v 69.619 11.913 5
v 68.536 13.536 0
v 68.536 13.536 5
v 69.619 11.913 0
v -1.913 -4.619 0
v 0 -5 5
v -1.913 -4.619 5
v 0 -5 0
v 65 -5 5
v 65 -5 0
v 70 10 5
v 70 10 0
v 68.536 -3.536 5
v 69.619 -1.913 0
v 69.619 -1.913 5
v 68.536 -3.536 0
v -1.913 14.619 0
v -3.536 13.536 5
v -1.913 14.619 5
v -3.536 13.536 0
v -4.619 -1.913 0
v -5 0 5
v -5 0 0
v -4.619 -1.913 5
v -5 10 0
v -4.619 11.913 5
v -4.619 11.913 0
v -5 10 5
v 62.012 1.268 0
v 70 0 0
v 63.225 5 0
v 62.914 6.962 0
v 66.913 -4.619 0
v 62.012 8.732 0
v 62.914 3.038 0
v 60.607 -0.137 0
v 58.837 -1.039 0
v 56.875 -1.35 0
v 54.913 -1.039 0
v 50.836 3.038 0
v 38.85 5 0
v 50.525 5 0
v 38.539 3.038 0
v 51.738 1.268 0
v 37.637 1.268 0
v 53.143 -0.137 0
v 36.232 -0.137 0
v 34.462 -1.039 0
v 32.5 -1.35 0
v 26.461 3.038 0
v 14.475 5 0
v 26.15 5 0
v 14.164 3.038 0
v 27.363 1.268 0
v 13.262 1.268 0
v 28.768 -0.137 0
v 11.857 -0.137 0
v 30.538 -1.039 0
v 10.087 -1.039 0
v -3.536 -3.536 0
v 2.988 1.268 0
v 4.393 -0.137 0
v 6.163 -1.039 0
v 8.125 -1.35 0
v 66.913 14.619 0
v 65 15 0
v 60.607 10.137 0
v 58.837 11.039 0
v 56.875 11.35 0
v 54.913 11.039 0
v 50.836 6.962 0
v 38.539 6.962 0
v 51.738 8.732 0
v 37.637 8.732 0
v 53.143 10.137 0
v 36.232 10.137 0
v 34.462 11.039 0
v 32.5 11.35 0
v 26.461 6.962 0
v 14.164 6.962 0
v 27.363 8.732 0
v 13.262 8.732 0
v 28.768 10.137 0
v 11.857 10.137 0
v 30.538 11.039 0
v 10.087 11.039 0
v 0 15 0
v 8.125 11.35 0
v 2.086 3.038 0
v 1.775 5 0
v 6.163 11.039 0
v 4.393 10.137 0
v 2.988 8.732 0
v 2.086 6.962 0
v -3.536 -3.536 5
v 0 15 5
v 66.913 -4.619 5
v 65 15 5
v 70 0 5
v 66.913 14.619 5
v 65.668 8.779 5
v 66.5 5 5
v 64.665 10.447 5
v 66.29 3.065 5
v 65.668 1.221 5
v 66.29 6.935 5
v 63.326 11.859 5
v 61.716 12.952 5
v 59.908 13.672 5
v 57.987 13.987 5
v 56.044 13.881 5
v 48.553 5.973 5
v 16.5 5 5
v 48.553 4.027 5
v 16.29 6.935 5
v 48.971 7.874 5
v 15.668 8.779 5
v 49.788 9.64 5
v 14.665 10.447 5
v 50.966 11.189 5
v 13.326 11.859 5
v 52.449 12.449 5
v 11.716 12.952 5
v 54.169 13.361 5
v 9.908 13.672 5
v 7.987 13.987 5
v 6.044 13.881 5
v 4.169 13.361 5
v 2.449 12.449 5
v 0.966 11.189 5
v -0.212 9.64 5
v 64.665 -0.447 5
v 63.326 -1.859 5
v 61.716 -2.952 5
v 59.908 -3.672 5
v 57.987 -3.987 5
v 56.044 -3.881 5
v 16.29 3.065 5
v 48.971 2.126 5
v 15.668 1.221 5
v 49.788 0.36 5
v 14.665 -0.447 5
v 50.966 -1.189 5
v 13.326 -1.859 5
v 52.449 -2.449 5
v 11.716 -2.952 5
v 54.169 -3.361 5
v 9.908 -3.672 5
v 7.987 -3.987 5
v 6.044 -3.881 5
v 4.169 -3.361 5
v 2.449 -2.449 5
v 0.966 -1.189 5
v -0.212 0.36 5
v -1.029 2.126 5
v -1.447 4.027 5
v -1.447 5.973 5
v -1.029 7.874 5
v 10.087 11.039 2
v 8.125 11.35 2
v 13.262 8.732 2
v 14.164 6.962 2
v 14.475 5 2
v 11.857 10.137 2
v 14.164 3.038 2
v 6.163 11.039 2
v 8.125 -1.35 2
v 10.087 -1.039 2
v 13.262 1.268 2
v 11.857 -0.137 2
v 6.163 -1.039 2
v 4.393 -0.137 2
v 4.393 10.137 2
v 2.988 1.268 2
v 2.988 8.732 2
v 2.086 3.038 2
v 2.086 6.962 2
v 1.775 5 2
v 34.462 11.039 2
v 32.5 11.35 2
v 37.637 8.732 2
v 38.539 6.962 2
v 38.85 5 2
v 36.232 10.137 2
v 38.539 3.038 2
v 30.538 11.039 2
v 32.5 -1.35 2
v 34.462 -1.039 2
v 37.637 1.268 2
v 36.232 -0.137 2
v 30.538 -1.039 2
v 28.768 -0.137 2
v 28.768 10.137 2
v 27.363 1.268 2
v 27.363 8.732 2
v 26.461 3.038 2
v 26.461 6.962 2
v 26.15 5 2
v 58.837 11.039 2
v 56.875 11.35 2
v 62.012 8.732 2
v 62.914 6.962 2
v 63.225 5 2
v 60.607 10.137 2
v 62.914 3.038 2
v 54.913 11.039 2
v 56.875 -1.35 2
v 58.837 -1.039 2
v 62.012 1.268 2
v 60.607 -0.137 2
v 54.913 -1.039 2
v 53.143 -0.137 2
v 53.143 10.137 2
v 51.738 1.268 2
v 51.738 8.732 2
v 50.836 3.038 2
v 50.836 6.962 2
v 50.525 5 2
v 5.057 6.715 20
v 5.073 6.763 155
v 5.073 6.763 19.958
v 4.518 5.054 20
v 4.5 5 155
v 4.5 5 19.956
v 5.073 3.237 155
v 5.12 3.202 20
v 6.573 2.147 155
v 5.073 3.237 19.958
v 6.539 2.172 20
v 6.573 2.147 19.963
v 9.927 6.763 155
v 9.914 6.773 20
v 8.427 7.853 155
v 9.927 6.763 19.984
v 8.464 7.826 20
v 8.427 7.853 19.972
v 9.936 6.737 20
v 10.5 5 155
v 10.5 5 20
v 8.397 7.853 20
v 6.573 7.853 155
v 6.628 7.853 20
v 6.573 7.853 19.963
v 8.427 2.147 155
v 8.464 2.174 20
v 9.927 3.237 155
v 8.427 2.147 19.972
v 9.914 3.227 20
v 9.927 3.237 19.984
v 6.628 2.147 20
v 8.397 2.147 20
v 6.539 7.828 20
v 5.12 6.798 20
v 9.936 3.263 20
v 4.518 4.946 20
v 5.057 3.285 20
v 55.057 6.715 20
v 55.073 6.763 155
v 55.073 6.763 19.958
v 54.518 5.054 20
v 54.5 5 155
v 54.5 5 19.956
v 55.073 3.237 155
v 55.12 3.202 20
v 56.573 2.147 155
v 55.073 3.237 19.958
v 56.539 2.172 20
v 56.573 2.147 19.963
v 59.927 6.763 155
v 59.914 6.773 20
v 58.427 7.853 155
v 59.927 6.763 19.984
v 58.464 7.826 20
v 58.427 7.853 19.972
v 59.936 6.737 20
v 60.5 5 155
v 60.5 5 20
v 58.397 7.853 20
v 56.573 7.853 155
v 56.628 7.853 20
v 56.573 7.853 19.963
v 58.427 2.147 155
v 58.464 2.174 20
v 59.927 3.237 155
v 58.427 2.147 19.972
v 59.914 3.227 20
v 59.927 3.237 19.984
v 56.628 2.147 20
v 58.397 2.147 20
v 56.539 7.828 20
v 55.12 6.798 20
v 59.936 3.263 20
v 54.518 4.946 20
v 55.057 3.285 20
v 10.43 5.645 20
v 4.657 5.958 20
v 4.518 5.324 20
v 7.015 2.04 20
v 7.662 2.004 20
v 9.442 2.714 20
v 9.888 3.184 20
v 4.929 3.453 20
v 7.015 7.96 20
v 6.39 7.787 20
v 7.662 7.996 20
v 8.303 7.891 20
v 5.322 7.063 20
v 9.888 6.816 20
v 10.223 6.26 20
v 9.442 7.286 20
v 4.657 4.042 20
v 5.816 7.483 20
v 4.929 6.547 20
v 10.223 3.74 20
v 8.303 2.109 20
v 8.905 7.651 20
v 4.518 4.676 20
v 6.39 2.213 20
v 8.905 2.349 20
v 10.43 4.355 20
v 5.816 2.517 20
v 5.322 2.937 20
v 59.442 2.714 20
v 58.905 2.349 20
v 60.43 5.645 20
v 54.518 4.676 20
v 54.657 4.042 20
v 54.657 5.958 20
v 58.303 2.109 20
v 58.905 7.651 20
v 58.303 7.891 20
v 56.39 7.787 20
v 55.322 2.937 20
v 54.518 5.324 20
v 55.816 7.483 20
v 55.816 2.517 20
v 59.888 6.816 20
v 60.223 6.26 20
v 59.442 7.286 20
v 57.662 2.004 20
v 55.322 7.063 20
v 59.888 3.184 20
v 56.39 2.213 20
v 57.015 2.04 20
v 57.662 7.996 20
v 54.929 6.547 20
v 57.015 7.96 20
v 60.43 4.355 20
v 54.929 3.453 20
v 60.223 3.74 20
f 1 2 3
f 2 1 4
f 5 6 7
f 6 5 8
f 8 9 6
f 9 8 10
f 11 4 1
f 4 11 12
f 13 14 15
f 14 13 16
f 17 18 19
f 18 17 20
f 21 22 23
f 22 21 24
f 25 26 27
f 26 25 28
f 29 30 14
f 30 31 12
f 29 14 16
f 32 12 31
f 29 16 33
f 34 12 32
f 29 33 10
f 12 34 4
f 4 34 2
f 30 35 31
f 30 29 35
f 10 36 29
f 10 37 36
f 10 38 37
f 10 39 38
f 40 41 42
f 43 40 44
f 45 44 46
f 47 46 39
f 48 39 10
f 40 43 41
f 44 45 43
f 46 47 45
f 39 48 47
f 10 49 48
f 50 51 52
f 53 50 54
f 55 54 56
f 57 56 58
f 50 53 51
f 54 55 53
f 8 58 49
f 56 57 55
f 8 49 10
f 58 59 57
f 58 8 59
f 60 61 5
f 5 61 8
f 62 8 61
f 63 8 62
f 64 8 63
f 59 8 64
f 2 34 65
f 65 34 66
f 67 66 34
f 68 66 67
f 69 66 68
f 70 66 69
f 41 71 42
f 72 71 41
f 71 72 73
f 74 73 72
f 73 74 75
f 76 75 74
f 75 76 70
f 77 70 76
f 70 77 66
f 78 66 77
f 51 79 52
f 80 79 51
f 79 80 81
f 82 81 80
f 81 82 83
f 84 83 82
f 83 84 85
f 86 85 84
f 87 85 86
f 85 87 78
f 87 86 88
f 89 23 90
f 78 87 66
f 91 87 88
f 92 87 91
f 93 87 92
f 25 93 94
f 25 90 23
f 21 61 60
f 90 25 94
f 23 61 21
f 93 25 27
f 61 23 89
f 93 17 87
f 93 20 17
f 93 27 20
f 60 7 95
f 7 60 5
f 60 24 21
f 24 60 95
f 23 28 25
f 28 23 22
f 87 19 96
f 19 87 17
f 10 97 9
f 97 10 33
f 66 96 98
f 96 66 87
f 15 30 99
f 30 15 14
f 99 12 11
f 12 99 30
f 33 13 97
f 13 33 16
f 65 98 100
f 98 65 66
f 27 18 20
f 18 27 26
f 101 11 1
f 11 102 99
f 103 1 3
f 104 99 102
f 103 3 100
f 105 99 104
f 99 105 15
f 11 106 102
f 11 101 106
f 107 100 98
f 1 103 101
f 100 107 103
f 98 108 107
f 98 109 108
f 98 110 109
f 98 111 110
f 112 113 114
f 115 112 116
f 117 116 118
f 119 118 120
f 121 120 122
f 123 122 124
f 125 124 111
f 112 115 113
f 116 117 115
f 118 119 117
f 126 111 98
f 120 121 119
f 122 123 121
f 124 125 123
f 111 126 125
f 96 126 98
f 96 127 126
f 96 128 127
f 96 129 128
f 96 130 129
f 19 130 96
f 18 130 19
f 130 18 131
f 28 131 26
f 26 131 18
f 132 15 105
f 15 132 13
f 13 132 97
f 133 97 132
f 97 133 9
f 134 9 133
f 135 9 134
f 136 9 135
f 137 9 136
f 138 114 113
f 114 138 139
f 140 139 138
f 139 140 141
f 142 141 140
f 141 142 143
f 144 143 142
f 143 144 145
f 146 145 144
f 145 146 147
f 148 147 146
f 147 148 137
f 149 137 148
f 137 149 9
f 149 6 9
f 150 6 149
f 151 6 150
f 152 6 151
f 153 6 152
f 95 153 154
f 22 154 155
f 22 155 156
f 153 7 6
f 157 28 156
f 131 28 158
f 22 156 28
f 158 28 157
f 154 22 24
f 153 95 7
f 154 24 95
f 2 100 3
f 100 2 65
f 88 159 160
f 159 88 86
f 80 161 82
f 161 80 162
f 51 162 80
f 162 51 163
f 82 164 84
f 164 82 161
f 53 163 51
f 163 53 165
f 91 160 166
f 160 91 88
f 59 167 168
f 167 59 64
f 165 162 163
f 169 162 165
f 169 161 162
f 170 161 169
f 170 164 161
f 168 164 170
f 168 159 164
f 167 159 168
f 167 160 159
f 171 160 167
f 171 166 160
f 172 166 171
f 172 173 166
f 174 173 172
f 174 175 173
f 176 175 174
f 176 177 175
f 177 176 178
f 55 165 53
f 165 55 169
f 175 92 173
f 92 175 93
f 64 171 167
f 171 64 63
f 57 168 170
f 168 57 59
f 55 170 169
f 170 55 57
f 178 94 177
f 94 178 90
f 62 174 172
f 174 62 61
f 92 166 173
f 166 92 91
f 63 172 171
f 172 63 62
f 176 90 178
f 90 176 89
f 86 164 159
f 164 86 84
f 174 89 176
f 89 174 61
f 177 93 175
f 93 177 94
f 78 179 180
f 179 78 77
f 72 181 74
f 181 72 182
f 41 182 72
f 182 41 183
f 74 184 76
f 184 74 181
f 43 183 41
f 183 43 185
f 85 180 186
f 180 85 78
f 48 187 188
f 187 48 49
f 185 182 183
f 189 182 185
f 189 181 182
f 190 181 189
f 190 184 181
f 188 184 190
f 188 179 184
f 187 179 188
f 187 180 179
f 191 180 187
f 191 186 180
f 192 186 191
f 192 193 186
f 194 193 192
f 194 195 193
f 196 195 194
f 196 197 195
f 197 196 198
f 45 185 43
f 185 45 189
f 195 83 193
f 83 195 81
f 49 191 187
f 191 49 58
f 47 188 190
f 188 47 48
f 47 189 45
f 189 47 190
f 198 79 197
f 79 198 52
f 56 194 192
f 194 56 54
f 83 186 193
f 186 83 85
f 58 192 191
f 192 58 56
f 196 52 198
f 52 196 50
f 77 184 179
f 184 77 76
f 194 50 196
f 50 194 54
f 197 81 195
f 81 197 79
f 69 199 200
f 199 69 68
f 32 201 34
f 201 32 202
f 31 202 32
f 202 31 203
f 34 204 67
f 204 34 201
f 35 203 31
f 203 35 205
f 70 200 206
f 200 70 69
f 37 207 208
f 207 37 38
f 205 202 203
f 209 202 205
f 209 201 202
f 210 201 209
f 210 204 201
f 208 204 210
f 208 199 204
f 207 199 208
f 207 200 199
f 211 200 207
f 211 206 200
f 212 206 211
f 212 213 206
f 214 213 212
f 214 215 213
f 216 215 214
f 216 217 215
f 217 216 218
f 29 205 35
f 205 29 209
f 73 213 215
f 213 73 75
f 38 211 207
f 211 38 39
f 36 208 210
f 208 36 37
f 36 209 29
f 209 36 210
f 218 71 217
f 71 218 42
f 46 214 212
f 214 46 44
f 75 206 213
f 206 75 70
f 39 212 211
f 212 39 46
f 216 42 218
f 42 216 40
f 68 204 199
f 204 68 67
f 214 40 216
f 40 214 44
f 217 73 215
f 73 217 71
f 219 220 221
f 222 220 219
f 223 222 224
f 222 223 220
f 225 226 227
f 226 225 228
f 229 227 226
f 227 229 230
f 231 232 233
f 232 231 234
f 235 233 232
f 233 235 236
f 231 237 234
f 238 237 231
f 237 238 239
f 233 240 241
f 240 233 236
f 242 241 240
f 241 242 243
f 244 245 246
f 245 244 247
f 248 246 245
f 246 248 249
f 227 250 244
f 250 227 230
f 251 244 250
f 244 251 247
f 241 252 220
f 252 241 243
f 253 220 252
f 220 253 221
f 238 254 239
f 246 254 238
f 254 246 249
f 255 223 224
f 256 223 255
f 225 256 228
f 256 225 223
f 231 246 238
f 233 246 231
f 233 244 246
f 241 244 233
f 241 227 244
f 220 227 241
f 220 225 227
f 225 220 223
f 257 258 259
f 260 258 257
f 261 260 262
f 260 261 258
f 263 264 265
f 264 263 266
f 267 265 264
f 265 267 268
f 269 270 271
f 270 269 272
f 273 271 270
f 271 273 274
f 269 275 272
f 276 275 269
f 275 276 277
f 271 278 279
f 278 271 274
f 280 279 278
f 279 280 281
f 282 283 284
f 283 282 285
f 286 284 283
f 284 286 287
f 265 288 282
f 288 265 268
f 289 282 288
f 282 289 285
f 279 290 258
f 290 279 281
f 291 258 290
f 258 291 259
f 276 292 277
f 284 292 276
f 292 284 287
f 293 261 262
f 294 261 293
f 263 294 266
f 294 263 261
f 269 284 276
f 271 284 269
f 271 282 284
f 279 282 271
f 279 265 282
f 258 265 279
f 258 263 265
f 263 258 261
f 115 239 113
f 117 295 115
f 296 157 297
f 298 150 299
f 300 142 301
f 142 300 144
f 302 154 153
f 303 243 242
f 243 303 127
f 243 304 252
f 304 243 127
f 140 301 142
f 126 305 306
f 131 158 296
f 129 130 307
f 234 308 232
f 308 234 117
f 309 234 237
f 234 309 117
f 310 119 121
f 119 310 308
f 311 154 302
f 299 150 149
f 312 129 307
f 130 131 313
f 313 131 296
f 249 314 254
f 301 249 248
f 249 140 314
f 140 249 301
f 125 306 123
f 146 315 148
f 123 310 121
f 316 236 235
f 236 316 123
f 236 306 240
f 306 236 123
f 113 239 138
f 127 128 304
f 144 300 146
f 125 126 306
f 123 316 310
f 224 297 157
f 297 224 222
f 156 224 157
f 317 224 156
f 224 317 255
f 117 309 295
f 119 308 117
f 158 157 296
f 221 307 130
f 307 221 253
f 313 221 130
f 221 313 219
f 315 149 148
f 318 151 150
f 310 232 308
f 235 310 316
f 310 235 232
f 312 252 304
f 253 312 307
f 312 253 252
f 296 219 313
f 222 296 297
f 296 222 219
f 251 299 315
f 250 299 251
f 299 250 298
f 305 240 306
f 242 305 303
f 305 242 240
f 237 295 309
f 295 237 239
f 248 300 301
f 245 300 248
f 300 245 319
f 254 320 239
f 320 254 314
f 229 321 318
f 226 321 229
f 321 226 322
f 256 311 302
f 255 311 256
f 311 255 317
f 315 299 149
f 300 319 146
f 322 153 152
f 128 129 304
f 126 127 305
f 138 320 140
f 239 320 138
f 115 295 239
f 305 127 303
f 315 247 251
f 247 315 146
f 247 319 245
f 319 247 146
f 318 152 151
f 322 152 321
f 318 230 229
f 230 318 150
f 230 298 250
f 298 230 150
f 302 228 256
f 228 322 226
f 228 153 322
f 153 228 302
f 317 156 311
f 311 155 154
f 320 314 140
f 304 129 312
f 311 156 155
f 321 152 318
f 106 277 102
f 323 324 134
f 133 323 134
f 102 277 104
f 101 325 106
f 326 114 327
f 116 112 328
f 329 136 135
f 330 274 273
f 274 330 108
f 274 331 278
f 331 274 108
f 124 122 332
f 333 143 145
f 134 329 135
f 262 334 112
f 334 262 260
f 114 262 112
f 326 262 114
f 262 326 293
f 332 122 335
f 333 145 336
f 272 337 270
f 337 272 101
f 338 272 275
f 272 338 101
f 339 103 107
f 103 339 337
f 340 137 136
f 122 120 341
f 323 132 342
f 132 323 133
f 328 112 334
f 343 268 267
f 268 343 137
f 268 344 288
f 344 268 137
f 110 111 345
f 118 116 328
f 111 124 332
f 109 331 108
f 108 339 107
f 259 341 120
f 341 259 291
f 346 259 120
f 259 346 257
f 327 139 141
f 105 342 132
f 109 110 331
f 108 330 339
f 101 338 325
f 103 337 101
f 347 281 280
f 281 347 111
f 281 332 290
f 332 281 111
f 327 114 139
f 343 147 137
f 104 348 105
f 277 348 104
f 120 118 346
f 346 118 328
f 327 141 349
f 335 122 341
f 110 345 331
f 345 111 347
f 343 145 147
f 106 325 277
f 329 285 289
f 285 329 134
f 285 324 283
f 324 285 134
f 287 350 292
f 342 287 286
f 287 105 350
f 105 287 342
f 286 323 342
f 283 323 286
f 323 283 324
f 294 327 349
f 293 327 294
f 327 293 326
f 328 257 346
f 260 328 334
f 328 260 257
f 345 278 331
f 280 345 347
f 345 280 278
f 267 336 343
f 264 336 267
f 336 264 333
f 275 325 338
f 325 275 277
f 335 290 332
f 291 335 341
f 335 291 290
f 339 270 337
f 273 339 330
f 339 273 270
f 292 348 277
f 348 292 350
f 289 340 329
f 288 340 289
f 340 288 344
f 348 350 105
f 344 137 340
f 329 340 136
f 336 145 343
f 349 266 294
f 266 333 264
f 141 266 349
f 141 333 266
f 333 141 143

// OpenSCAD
// Base of stand
// Note, remote the radius from the dimensions
// of th rectangular base
base_width = 10;
base_thickness = 5;
base_length = 65;
curve_radius = 5;

// Magnet Holes
magnet_radius = 6.35;
magnet_depth = 2;

// Risers
riser_radius = 3;
riser_height = 150;
riser_separation = 50;

// Make the base of the stand with holes for the magnets
difference(){
// Base
linear_extrude(height = base_thickness) 
minkowski()
{
square([base_length ,base_width]);
circle(5);
}

// Make holes in base for magnets
translate([base_length/8,base_width/2,0]) cylinder(magnet_depth, magnet_radius,magnet_radius);
translate([base_length/8*4,base_width/2,0]) cylinder(magnet_depth, magnet_radius,magnet_radius);
translate([base_length/8*7,base_width/2,0]) cylinder(magnet_depth, magnet_radius,magnet_radius);

}

// Make Risers for the DCDT Mount
translate([base_length/2-riser_separation/2,base_width/2,base_thickness]) cylinder(riser_height,riser_radius,riser_radius);

translate([base_length/2+riser_separation/2,base_width/2,base_thickness]) cylinder(riser_height,riser_radius,riser_radius);

// Put Strain Reliefs on risers
translate([base_length/2-riser_separation/2,base_width/2,base_thickness]) cylinder(15,riser_radius*3,riser_radius);

translate([base_length/2+riser_separation/2,base_width/2,base_thickness]) cylinder(15,riser_radius*3,riser_radius);
